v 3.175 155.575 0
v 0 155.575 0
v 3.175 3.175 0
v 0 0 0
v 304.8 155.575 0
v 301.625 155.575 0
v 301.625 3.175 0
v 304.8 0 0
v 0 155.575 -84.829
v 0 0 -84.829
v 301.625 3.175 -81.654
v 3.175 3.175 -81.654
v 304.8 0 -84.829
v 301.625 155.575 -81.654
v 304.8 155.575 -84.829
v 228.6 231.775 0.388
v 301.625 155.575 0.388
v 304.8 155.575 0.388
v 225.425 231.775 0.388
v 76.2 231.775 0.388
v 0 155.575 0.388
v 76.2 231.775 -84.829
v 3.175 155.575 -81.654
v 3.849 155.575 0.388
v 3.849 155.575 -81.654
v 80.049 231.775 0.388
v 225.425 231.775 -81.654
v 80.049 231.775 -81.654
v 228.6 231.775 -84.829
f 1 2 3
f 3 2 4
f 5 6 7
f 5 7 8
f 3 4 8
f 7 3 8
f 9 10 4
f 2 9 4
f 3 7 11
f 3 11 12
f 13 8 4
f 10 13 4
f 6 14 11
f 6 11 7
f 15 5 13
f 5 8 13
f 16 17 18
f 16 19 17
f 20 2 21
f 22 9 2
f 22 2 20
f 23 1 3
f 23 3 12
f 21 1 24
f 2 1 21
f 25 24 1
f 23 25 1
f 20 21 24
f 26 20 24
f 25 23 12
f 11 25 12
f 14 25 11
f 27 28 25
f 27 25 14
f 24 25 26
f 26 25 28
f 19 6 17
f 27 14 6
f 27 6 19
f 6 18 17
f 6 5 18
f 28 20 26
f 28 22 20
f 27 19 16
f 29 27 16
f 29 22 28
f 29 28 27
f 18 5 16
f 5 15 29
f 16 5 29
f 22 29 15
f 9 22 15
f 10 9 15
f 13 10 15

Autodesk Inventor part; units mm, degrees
ref_plane "YZ Plane" through (0, 0, 0) normal (1, 0, 0) x (0, 1, 0)
ref_plane "XZ Plane" through (0, 0, 0) normal (0, 1, 0) x (-1, 0, 0)
ref_plane "XY Plane" through (0, 0, 0) normal (0, 0, 1) x (1, 0, 0)
sketch "Sketch1" plane through (0, 0, 0) normal (0, 1, 0) x (-1, 0, 0)
  line L0 (0, 0) -> (-304.8, 0)
  line L1 (-304.8, 0) -> (-304.8, -84.8294)
  line L2 (-304.8, -84.8294) -> (0, -84.8294)
  line L3 (0, -84.8294) -> (0, 0)
  dimension "d0" = 304.8
extrude "Extrusion1" add sketch "Sketch1" along normal blind 3.175
sketch "Sketch2" plane through (0, 3.175, 0) normal (0, 1, 0) x (1, 0, 0)
  line L0 (0, 0) -> (304.8, 0) projected
  line L1 (3.175, 0) -> (3.175, 81.6544)
  line L2 (3.175, 81.6544) -> (301.625, 81.6544)
  line L3 (301.625, 81.6544) -> (301.625, 0)
  line L4 (304.8, 0) -> (304.8, 84.8294) projected
  line L5 (0, 84.8294) -> (0, 0) projected
  line L6 (304.8, 84.8294) -> (0, 84.8294) projected
  line L7 (0, 0) -> (3.175, 0)
  line L8 (304.8, 0) -> (301.625, 0)
  dimension "d3" = 3.175
  dimension "d4" = 3.175
  dimension "d5" = 3.175
extrude "Extrusion2" add sketch "Sketch2" along normal blind 152.4 contours L5 L6 L4 L0 L3 L2 L1
sketch "Sketch4" plane through (3.175, 3.175, -81.6544) normal (0, 0, 1) x (1, 0, 0)
  line L0 (-3.175, 152.4) -> (73.025, 228.6)
  line L1 (301.625, 152.4) -> (-3.175, 152.4) projected
  line L2 (301.625, 152.4) -> (225.425, 228.6)
  line L3 (225.425, 228.6) -> (73.025, 228.6)
  point P0 (-3.175, -3.175)
  point P1 (-3.175, 152.4)
  dimension "d11" = 152.4
  dimension "d12" = 76.2
extrude "Extrusion3" add sketch "Sketch4" against normal blind 3.175
sketch "Sketch7" plane through (3.175, 3.175, -81.6544) normal (0, 0, 1) x (1, 0, 0)
  line L0 (0.6738, 152.4) -> (76.8738, 228.6)
  line L1 (-3.175, 152.4) -> (73.025, 228.6) projected
  line L2 (0.6738, 152.4) -> (-3.175, 152.4)
  line L3 (73.025, 228.6) -> (225.425, 228.6) projected
  line L4 (73.025, 228.6) -> (76.8738, 228.6)
  point P0 (-3.175, -3.175)
extrude "Extrusion4" add sketch "Sketch7" along normal blind 82.042
sketch "Sketch8" plane through (3.175, 3.175, -81.6544) normal (0, 0, 1) x (1, 0, 0)
  line L0 (301.625, -3.175) -> (301.625, 152.4) projected
  line L1 (298.45, 0) -> (298.45, 152.4) projected
  line L2 (301.625, 152.4) -> (298.45, 152.4)
  line L3 (298.45, 152.4) -> (222.25, 228.6)
  line L4 (76.8738, 228.6) -> (225.425, 228.6) projected
  line L5 (301.625, 152.4) -> (225.425, 228.6)
  point P0 (-3.175, -3.175)
  dimension "d19" = 3.175
extrude "Extrusion5" add sketch "Sketch8" along normal blind 82.042
properties part number "15102898-16-P-0203"
